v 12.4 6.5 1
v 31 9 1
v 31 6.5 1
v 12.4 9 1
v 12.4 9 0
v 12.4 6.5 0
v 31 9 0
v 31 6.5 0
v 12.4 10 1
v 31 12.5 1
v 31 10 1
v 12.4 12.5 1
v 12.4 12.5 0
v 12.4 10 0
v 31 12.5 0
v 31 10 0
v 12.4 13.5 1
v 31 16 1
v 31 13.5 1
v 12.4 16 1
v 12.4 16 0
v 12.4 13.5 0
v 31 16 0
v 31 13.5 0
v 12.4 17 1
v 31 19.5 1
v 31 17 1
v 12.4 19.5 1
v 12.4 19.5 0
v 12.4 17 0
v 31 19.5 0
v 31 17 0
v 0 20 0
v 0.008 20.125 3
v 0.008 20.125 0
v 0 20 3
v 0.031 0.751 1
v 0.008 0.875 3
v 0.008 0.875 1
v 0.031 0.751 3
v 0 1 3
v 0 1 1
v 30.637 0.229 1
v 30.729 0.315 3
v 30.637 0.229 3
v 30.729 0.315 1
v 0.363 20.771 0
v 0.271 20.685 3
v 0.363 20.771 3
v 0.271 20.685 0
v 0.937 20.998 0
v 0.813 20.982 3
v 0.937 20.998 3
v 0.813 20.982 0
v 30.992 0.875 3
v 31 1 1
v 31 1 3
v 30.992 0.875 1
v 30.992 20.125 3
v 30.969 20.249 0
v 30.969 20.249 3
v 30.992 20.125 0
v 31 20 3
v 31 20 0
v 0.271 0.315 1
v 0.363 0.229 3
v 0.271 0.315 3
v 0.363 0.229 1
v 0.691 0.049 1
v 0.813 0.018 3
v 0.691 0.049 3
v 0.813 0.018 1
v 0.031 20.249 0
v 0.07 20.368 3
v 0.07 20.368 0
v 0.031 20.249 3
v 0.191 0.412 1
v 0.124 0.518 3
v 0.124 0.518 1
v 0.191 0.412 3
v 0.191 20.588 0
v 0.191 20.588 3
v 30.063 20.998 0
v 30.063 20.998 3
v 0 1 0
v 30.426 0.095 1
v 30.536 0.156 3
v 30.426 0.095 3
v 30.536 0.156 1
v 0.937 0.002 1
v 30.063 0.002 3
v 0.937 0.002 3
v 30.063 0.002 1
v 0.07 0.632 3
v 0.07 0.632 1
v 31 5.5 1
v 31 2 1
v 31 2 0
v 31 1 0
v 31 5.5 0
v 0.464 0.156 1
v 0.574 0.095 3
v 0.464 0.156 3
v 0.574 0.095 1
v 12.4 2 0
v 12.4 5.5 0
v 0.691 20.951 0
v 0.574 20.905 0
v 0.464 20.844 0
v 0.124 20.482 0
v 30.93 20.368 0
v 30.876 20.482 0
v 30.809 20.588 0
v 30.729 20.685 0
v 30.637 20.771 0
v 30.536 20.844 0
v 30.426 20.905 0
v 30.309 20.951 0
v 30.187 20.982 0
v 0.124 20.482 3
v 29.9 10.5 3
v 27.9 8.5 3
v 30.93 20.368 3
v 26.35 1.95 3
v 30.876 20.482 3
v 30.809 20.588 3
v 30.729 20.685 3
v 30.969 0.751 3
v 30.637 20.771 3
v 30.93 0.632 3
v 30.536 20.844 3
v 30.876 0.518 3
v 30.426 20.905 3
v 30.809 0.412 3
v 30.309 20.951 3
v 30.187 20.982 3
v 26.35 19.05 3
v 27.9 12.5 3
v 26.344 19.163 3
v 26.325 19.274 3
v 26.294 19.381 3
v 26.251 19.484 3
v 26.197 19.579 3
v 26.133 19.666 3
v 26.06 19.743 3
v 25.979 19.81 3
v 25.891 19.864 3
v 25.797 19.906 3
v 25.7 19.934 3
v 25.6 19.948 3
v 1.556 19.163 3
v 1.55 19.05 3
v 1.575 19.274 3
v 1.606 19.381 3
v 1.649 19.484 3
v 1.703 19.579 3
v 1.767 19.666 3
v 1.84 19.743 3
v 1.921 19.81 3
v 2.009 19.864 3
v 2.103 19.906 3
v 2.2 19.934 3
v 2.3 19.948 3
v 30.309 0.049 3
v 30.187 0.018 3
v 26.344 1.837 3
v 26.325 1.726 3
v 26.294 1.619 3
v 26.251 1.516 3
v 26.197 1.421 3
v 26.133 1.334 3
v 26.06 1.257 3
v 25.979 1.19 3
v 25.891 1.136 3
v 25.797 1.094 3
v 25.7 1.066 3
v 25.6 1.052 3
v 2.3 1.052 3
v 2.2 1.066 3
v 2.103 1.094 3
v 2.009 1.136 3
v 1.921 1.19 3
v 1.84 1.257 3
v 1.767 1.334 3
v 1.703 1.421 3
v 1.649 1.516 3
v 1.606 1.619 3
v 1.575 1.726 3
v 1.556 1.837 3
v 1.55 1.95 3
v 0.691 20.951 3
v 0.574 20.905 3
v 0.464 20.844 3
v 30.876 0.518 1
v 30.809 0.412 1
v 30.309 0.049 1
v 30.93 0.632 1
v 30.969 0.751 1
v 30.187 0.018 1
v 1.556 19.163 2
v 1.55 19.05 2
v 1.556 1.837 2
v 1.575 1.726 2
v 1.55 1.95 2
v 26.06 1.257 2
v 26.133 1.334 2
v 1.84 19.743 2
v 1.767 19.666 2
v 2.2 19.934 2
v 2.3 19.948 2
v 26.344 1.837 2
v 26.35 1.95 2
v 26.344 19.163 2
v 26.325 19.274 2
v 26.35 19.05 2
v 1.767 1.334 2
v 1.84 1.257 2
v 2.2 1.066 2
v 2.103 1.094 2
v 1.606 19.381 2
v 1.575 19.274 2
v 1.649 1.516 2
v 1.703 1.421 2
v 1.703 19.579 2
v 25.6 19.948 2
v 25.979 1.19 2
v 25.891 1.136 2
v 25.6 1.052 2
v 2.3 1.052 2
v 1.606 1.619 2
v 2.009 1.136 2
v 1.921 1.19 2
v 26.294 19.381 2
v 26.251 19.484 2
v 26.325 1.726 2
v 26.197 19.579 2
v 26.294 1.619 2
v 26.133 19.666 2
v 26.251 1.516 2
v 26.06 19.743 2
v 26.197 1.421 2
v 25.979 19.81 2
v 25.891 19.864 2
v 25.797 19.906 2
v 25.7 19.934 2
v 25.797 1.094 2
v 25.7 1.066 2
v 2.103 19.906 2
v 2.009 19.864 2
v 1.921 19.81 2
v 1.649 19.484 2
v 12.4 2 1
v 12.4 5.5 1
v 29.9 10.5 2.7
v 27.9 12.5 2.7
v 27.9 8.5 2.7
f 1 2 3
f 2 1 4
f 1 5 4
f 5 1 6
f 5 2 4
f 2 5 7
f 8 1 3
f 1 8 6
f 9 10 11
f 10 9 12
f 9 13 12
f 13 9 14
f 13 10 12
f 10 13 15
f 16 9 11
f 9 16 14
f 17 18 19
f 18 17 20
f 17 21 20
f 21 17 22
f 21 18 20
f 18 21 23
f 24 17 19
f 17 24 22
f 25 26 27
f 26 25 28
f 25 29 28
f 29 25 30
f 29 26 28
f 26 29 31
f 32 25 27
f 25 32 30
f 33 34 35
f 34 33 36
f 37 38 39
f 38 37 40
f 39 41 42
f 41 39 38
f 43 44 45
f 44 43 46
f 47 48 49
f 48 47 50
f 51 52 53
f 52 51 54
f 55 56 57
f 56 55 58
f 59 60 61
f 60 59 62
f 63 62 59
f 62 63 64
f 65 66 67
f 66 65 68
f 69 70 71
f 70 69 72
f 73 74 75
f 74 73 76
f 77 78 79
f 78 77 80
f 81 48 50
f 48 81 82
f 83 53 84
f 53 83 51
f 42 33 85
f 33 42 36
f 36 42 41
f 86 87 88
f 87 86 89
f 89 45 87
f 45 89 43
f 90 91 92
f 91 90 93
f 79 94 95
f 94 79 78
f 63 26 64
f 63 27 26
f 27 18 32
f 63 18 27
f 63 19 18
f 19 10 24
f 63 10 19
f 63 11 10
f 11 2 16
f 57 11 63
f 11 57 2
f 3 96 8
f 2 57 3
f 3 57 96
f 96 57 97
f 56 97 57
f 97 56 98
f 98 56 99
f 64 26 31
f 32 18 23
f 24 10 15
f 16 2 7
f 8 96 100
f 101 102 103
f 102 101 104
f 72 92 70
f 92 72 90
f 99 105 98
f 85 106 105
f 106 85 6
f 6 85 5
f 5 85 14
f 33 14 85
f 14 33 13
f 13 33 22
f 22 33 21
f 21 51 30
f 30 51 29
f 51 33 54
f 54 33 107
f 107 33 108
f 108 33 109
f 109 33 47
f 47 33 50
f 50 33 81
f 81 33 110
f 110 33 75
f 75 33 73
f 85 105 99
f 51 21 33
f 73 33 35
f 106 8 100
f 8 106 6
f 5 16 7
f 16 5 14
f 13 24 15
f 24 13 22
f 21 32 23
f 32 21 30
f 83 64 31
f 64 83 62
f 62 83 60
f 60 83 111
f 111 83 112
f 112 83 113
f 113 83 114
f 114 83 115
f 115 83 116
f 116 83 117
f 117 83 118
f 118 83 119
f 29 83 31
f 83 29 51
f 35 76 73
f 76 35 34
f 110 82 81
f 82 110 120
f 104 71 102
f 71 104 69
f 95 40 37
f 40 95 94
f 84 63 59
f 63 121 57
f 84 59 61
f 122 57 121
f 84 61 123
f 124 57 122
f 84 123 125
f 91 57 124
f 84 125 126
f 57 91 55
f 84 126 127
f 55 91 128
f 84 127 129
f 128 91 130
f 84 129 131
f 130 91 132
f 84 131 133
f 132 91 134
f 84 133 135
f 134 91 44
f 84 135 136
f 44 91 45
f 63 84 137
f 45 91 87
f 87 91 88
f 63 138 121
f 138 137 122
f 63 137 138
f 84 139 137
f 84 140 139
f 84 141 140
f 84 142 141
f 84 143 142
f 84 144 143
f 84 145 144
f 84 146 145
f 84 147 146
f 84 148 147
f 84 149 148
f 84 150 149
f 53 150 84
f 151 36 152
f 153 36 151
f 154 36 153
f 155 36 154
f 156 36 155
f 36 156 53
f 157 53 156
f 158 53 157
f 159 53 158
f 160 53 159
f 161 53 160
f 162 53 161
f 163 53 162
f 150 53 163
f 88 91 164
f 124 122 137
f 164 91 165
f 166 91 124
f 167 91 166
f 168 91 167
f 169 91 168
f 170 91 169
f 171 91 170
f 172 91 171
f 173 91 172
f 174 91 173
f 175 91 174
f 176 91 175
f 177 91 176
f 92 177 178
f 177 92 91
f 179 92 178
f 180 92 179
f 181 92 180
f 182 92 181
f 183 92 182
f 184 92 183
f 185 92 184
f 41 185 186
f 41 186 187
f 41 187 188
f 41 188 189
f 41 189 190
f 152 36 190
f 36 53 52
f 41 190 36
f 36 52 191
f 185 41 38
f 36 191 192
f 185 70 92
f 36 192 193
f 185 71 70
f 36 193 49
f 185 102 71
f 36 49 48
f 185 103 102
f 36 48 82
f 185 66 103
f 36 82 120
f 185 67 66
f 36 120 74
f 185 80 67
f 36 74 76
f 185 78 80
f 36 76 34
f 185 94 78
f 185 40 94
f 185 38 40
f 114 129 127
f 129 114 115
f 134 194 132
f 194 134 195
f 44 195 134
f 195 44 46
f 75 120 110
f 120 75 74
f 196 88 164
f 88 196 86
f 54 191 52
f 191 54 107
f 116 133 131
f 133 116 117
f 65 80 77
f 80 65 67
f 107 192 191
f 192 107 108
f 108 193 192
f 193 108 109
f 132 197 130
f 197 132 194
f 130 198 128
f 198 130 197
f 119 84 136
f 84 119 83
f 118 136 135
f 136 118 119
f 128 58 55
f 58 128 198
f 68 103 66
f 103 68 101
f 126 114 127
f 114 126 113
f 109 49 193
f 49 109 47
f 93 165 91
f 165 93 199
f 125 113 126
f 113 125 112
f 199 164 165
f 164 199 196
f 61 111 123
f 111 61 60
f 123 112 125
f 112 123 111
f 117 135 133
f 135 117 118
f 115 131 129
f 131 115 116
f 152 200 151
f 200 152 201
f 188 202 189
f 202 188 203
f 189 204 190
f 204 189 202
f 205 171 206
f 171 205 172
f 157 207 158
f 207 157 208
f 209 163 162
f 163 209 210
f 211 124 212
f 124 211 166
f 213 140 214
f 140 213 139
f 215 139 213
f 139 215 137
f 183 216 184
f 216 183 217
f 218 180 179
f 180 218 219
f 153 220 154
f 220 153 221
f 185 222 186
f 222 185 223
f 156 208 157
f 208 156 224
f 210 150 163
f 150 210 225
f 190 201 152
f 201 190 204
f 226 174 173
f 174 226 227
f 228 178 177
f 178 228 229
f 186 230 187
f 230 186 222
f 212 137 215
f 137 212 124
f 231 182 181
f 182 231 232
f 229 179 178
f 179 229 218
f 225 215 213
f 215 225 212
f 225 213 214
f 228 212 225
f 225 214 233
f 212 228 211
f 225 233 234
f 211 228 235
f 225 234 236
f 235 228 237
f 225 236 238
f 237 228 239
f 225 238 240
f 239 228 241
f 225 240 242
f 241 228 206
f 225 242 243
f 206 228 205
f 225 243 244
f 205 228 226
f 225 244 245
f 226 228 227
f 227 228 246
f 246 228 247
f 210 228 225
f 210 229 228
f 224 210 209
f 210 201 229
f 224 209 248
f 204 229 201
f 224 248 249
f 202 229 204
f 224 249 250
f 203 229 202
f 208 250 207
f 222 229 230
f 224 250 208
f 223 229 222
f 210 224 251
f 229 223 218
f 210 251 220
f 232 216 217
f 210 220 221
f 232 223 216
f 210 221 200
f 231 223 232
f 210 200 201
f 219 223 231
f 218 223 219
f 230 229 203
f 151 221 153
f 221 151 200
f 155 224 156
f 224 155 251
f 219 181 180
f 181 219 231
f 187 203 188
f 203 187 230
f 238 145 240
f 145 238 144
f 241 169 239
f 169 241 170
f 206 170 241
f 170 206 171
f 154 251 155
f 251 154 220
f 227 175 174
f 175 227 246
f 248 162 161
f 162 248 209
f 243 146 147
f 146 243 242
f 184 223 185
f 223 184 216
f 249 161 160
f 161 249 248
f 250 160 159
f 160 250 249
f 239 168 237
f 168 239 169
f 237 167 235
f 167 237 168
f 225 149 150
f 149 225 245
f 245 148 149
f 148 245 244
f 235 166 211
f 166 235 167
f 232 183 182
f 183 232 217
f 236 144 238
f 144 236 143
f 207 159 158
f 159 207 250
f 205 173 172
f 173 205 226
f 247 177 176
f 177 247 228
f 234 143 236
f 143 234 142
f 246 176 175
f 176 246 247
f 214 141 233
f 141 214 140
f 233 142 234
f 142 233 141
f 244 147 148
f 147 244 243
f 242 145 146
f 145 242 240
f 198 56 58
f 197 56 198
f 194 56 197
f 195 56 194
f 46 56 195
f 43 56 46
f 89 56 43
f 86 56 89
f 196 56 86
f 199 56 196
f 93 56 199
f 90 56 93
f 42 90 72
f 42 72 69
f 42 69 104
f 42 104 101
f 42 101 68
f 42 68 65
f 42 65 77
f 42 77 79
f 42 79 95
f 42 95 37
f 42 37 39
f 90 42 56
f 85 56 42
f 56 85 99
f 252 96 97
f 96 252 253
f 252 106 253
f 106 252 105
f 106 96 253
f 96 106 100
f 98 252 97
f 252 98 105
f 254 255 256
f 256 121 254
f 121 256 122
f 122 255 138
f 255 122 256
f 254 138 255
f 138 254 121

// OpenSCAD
// file: nintendo_switch_constants.scad
// Nintendo Switch Constants

// Game Cartridge dimensions (approximate)
// Units: mm
height = 31.0;
width = 21.0;
depth = 3.0;
radius=1.0;

// Small value to ensure intersection
epsilon=0.1;
// main file
// Nintendo Switch Game Cartridge

include <nintendo_switch_constants.scad>;
my_text = "The Legend of Fejka";
$fn=50;

// A rounded box of the appropriate dimensions (height, width, depth)
module base_form() {
    linear_extrude(depth) {
        hull() {
            for (x=[radius:height-2*radius:height-radius]) {
                for (y=[radius:width-2*radius:width-radius]) {
                    echo(x=x, y=y);
                    translate([x, y, 0.0])
                        circle(radius);
                }
            }
        }
    }
}

/*
color("red", 1.0)
base_form();
*/

module cartridge(line1, line2) {
    difference() {
        base_form();
        translate([0.05 * height, 0.05 * width, depth-1]) {
            scale(v=[0.8, 0.9, 1]) {
                base_form();
            }
        }

        translate([0.0, 0.0, -epsilon]) {
            cube(size=[height + epsilon, 1, 1.0 + epsilon]);
        }

        translate([0.4 * height, 2.0, -epsilon]) {
            cube(size=[0.6 * height+epsilon, 3.5, 1.0 + epsilon]);
        }

        start = 3.0;
        for (i = [1:4]) {
            y = start + 3.5 * i;
            translate([0.4 * height, y, -epsilon]) {
                cube(size=[0.6 * height + epsilon, 2.5, 1.0 + epsilon]);
            }
        }

        translate([0.9 * height, width / 2.0, 0.9*depth]) {
            linear_extrude(height=1.0) {
                polygon([[2.0, 0.0], [0.0, 2.0], [0.0, -2.0]]);
            }
        }

    }

    %translate([0.20 * height, 0.5 * width, depth - 1]) {
        scale(v=[0.5, 0.5, 1.0]) {
            rotate(a=[0,0,90]){
                linear_extrude(height=1) {
                    text("Nentandu", size=6, halign="center");
                }
            }
        }
    }



    %translate([0.40 * height, 0.5 * width, depth - 1]) {
        scale(v=[0.5, 0.5, 1.0]) {
            rotate(a=[0,0,90]){
                linear_extrude(height=1) {
                    multiline(line1, line2);
                }
            }
        }
    }

}

module multiline(line1, line2) {
    text(line1, size=5, halign="center");
    translate([0.0, -7.0, 0.0]) {
        text(line2, size=6, halign="center");
    }
}

//multiline("The Legend", "of Fejka");

cartridge("The Legend", "of Fejka");
